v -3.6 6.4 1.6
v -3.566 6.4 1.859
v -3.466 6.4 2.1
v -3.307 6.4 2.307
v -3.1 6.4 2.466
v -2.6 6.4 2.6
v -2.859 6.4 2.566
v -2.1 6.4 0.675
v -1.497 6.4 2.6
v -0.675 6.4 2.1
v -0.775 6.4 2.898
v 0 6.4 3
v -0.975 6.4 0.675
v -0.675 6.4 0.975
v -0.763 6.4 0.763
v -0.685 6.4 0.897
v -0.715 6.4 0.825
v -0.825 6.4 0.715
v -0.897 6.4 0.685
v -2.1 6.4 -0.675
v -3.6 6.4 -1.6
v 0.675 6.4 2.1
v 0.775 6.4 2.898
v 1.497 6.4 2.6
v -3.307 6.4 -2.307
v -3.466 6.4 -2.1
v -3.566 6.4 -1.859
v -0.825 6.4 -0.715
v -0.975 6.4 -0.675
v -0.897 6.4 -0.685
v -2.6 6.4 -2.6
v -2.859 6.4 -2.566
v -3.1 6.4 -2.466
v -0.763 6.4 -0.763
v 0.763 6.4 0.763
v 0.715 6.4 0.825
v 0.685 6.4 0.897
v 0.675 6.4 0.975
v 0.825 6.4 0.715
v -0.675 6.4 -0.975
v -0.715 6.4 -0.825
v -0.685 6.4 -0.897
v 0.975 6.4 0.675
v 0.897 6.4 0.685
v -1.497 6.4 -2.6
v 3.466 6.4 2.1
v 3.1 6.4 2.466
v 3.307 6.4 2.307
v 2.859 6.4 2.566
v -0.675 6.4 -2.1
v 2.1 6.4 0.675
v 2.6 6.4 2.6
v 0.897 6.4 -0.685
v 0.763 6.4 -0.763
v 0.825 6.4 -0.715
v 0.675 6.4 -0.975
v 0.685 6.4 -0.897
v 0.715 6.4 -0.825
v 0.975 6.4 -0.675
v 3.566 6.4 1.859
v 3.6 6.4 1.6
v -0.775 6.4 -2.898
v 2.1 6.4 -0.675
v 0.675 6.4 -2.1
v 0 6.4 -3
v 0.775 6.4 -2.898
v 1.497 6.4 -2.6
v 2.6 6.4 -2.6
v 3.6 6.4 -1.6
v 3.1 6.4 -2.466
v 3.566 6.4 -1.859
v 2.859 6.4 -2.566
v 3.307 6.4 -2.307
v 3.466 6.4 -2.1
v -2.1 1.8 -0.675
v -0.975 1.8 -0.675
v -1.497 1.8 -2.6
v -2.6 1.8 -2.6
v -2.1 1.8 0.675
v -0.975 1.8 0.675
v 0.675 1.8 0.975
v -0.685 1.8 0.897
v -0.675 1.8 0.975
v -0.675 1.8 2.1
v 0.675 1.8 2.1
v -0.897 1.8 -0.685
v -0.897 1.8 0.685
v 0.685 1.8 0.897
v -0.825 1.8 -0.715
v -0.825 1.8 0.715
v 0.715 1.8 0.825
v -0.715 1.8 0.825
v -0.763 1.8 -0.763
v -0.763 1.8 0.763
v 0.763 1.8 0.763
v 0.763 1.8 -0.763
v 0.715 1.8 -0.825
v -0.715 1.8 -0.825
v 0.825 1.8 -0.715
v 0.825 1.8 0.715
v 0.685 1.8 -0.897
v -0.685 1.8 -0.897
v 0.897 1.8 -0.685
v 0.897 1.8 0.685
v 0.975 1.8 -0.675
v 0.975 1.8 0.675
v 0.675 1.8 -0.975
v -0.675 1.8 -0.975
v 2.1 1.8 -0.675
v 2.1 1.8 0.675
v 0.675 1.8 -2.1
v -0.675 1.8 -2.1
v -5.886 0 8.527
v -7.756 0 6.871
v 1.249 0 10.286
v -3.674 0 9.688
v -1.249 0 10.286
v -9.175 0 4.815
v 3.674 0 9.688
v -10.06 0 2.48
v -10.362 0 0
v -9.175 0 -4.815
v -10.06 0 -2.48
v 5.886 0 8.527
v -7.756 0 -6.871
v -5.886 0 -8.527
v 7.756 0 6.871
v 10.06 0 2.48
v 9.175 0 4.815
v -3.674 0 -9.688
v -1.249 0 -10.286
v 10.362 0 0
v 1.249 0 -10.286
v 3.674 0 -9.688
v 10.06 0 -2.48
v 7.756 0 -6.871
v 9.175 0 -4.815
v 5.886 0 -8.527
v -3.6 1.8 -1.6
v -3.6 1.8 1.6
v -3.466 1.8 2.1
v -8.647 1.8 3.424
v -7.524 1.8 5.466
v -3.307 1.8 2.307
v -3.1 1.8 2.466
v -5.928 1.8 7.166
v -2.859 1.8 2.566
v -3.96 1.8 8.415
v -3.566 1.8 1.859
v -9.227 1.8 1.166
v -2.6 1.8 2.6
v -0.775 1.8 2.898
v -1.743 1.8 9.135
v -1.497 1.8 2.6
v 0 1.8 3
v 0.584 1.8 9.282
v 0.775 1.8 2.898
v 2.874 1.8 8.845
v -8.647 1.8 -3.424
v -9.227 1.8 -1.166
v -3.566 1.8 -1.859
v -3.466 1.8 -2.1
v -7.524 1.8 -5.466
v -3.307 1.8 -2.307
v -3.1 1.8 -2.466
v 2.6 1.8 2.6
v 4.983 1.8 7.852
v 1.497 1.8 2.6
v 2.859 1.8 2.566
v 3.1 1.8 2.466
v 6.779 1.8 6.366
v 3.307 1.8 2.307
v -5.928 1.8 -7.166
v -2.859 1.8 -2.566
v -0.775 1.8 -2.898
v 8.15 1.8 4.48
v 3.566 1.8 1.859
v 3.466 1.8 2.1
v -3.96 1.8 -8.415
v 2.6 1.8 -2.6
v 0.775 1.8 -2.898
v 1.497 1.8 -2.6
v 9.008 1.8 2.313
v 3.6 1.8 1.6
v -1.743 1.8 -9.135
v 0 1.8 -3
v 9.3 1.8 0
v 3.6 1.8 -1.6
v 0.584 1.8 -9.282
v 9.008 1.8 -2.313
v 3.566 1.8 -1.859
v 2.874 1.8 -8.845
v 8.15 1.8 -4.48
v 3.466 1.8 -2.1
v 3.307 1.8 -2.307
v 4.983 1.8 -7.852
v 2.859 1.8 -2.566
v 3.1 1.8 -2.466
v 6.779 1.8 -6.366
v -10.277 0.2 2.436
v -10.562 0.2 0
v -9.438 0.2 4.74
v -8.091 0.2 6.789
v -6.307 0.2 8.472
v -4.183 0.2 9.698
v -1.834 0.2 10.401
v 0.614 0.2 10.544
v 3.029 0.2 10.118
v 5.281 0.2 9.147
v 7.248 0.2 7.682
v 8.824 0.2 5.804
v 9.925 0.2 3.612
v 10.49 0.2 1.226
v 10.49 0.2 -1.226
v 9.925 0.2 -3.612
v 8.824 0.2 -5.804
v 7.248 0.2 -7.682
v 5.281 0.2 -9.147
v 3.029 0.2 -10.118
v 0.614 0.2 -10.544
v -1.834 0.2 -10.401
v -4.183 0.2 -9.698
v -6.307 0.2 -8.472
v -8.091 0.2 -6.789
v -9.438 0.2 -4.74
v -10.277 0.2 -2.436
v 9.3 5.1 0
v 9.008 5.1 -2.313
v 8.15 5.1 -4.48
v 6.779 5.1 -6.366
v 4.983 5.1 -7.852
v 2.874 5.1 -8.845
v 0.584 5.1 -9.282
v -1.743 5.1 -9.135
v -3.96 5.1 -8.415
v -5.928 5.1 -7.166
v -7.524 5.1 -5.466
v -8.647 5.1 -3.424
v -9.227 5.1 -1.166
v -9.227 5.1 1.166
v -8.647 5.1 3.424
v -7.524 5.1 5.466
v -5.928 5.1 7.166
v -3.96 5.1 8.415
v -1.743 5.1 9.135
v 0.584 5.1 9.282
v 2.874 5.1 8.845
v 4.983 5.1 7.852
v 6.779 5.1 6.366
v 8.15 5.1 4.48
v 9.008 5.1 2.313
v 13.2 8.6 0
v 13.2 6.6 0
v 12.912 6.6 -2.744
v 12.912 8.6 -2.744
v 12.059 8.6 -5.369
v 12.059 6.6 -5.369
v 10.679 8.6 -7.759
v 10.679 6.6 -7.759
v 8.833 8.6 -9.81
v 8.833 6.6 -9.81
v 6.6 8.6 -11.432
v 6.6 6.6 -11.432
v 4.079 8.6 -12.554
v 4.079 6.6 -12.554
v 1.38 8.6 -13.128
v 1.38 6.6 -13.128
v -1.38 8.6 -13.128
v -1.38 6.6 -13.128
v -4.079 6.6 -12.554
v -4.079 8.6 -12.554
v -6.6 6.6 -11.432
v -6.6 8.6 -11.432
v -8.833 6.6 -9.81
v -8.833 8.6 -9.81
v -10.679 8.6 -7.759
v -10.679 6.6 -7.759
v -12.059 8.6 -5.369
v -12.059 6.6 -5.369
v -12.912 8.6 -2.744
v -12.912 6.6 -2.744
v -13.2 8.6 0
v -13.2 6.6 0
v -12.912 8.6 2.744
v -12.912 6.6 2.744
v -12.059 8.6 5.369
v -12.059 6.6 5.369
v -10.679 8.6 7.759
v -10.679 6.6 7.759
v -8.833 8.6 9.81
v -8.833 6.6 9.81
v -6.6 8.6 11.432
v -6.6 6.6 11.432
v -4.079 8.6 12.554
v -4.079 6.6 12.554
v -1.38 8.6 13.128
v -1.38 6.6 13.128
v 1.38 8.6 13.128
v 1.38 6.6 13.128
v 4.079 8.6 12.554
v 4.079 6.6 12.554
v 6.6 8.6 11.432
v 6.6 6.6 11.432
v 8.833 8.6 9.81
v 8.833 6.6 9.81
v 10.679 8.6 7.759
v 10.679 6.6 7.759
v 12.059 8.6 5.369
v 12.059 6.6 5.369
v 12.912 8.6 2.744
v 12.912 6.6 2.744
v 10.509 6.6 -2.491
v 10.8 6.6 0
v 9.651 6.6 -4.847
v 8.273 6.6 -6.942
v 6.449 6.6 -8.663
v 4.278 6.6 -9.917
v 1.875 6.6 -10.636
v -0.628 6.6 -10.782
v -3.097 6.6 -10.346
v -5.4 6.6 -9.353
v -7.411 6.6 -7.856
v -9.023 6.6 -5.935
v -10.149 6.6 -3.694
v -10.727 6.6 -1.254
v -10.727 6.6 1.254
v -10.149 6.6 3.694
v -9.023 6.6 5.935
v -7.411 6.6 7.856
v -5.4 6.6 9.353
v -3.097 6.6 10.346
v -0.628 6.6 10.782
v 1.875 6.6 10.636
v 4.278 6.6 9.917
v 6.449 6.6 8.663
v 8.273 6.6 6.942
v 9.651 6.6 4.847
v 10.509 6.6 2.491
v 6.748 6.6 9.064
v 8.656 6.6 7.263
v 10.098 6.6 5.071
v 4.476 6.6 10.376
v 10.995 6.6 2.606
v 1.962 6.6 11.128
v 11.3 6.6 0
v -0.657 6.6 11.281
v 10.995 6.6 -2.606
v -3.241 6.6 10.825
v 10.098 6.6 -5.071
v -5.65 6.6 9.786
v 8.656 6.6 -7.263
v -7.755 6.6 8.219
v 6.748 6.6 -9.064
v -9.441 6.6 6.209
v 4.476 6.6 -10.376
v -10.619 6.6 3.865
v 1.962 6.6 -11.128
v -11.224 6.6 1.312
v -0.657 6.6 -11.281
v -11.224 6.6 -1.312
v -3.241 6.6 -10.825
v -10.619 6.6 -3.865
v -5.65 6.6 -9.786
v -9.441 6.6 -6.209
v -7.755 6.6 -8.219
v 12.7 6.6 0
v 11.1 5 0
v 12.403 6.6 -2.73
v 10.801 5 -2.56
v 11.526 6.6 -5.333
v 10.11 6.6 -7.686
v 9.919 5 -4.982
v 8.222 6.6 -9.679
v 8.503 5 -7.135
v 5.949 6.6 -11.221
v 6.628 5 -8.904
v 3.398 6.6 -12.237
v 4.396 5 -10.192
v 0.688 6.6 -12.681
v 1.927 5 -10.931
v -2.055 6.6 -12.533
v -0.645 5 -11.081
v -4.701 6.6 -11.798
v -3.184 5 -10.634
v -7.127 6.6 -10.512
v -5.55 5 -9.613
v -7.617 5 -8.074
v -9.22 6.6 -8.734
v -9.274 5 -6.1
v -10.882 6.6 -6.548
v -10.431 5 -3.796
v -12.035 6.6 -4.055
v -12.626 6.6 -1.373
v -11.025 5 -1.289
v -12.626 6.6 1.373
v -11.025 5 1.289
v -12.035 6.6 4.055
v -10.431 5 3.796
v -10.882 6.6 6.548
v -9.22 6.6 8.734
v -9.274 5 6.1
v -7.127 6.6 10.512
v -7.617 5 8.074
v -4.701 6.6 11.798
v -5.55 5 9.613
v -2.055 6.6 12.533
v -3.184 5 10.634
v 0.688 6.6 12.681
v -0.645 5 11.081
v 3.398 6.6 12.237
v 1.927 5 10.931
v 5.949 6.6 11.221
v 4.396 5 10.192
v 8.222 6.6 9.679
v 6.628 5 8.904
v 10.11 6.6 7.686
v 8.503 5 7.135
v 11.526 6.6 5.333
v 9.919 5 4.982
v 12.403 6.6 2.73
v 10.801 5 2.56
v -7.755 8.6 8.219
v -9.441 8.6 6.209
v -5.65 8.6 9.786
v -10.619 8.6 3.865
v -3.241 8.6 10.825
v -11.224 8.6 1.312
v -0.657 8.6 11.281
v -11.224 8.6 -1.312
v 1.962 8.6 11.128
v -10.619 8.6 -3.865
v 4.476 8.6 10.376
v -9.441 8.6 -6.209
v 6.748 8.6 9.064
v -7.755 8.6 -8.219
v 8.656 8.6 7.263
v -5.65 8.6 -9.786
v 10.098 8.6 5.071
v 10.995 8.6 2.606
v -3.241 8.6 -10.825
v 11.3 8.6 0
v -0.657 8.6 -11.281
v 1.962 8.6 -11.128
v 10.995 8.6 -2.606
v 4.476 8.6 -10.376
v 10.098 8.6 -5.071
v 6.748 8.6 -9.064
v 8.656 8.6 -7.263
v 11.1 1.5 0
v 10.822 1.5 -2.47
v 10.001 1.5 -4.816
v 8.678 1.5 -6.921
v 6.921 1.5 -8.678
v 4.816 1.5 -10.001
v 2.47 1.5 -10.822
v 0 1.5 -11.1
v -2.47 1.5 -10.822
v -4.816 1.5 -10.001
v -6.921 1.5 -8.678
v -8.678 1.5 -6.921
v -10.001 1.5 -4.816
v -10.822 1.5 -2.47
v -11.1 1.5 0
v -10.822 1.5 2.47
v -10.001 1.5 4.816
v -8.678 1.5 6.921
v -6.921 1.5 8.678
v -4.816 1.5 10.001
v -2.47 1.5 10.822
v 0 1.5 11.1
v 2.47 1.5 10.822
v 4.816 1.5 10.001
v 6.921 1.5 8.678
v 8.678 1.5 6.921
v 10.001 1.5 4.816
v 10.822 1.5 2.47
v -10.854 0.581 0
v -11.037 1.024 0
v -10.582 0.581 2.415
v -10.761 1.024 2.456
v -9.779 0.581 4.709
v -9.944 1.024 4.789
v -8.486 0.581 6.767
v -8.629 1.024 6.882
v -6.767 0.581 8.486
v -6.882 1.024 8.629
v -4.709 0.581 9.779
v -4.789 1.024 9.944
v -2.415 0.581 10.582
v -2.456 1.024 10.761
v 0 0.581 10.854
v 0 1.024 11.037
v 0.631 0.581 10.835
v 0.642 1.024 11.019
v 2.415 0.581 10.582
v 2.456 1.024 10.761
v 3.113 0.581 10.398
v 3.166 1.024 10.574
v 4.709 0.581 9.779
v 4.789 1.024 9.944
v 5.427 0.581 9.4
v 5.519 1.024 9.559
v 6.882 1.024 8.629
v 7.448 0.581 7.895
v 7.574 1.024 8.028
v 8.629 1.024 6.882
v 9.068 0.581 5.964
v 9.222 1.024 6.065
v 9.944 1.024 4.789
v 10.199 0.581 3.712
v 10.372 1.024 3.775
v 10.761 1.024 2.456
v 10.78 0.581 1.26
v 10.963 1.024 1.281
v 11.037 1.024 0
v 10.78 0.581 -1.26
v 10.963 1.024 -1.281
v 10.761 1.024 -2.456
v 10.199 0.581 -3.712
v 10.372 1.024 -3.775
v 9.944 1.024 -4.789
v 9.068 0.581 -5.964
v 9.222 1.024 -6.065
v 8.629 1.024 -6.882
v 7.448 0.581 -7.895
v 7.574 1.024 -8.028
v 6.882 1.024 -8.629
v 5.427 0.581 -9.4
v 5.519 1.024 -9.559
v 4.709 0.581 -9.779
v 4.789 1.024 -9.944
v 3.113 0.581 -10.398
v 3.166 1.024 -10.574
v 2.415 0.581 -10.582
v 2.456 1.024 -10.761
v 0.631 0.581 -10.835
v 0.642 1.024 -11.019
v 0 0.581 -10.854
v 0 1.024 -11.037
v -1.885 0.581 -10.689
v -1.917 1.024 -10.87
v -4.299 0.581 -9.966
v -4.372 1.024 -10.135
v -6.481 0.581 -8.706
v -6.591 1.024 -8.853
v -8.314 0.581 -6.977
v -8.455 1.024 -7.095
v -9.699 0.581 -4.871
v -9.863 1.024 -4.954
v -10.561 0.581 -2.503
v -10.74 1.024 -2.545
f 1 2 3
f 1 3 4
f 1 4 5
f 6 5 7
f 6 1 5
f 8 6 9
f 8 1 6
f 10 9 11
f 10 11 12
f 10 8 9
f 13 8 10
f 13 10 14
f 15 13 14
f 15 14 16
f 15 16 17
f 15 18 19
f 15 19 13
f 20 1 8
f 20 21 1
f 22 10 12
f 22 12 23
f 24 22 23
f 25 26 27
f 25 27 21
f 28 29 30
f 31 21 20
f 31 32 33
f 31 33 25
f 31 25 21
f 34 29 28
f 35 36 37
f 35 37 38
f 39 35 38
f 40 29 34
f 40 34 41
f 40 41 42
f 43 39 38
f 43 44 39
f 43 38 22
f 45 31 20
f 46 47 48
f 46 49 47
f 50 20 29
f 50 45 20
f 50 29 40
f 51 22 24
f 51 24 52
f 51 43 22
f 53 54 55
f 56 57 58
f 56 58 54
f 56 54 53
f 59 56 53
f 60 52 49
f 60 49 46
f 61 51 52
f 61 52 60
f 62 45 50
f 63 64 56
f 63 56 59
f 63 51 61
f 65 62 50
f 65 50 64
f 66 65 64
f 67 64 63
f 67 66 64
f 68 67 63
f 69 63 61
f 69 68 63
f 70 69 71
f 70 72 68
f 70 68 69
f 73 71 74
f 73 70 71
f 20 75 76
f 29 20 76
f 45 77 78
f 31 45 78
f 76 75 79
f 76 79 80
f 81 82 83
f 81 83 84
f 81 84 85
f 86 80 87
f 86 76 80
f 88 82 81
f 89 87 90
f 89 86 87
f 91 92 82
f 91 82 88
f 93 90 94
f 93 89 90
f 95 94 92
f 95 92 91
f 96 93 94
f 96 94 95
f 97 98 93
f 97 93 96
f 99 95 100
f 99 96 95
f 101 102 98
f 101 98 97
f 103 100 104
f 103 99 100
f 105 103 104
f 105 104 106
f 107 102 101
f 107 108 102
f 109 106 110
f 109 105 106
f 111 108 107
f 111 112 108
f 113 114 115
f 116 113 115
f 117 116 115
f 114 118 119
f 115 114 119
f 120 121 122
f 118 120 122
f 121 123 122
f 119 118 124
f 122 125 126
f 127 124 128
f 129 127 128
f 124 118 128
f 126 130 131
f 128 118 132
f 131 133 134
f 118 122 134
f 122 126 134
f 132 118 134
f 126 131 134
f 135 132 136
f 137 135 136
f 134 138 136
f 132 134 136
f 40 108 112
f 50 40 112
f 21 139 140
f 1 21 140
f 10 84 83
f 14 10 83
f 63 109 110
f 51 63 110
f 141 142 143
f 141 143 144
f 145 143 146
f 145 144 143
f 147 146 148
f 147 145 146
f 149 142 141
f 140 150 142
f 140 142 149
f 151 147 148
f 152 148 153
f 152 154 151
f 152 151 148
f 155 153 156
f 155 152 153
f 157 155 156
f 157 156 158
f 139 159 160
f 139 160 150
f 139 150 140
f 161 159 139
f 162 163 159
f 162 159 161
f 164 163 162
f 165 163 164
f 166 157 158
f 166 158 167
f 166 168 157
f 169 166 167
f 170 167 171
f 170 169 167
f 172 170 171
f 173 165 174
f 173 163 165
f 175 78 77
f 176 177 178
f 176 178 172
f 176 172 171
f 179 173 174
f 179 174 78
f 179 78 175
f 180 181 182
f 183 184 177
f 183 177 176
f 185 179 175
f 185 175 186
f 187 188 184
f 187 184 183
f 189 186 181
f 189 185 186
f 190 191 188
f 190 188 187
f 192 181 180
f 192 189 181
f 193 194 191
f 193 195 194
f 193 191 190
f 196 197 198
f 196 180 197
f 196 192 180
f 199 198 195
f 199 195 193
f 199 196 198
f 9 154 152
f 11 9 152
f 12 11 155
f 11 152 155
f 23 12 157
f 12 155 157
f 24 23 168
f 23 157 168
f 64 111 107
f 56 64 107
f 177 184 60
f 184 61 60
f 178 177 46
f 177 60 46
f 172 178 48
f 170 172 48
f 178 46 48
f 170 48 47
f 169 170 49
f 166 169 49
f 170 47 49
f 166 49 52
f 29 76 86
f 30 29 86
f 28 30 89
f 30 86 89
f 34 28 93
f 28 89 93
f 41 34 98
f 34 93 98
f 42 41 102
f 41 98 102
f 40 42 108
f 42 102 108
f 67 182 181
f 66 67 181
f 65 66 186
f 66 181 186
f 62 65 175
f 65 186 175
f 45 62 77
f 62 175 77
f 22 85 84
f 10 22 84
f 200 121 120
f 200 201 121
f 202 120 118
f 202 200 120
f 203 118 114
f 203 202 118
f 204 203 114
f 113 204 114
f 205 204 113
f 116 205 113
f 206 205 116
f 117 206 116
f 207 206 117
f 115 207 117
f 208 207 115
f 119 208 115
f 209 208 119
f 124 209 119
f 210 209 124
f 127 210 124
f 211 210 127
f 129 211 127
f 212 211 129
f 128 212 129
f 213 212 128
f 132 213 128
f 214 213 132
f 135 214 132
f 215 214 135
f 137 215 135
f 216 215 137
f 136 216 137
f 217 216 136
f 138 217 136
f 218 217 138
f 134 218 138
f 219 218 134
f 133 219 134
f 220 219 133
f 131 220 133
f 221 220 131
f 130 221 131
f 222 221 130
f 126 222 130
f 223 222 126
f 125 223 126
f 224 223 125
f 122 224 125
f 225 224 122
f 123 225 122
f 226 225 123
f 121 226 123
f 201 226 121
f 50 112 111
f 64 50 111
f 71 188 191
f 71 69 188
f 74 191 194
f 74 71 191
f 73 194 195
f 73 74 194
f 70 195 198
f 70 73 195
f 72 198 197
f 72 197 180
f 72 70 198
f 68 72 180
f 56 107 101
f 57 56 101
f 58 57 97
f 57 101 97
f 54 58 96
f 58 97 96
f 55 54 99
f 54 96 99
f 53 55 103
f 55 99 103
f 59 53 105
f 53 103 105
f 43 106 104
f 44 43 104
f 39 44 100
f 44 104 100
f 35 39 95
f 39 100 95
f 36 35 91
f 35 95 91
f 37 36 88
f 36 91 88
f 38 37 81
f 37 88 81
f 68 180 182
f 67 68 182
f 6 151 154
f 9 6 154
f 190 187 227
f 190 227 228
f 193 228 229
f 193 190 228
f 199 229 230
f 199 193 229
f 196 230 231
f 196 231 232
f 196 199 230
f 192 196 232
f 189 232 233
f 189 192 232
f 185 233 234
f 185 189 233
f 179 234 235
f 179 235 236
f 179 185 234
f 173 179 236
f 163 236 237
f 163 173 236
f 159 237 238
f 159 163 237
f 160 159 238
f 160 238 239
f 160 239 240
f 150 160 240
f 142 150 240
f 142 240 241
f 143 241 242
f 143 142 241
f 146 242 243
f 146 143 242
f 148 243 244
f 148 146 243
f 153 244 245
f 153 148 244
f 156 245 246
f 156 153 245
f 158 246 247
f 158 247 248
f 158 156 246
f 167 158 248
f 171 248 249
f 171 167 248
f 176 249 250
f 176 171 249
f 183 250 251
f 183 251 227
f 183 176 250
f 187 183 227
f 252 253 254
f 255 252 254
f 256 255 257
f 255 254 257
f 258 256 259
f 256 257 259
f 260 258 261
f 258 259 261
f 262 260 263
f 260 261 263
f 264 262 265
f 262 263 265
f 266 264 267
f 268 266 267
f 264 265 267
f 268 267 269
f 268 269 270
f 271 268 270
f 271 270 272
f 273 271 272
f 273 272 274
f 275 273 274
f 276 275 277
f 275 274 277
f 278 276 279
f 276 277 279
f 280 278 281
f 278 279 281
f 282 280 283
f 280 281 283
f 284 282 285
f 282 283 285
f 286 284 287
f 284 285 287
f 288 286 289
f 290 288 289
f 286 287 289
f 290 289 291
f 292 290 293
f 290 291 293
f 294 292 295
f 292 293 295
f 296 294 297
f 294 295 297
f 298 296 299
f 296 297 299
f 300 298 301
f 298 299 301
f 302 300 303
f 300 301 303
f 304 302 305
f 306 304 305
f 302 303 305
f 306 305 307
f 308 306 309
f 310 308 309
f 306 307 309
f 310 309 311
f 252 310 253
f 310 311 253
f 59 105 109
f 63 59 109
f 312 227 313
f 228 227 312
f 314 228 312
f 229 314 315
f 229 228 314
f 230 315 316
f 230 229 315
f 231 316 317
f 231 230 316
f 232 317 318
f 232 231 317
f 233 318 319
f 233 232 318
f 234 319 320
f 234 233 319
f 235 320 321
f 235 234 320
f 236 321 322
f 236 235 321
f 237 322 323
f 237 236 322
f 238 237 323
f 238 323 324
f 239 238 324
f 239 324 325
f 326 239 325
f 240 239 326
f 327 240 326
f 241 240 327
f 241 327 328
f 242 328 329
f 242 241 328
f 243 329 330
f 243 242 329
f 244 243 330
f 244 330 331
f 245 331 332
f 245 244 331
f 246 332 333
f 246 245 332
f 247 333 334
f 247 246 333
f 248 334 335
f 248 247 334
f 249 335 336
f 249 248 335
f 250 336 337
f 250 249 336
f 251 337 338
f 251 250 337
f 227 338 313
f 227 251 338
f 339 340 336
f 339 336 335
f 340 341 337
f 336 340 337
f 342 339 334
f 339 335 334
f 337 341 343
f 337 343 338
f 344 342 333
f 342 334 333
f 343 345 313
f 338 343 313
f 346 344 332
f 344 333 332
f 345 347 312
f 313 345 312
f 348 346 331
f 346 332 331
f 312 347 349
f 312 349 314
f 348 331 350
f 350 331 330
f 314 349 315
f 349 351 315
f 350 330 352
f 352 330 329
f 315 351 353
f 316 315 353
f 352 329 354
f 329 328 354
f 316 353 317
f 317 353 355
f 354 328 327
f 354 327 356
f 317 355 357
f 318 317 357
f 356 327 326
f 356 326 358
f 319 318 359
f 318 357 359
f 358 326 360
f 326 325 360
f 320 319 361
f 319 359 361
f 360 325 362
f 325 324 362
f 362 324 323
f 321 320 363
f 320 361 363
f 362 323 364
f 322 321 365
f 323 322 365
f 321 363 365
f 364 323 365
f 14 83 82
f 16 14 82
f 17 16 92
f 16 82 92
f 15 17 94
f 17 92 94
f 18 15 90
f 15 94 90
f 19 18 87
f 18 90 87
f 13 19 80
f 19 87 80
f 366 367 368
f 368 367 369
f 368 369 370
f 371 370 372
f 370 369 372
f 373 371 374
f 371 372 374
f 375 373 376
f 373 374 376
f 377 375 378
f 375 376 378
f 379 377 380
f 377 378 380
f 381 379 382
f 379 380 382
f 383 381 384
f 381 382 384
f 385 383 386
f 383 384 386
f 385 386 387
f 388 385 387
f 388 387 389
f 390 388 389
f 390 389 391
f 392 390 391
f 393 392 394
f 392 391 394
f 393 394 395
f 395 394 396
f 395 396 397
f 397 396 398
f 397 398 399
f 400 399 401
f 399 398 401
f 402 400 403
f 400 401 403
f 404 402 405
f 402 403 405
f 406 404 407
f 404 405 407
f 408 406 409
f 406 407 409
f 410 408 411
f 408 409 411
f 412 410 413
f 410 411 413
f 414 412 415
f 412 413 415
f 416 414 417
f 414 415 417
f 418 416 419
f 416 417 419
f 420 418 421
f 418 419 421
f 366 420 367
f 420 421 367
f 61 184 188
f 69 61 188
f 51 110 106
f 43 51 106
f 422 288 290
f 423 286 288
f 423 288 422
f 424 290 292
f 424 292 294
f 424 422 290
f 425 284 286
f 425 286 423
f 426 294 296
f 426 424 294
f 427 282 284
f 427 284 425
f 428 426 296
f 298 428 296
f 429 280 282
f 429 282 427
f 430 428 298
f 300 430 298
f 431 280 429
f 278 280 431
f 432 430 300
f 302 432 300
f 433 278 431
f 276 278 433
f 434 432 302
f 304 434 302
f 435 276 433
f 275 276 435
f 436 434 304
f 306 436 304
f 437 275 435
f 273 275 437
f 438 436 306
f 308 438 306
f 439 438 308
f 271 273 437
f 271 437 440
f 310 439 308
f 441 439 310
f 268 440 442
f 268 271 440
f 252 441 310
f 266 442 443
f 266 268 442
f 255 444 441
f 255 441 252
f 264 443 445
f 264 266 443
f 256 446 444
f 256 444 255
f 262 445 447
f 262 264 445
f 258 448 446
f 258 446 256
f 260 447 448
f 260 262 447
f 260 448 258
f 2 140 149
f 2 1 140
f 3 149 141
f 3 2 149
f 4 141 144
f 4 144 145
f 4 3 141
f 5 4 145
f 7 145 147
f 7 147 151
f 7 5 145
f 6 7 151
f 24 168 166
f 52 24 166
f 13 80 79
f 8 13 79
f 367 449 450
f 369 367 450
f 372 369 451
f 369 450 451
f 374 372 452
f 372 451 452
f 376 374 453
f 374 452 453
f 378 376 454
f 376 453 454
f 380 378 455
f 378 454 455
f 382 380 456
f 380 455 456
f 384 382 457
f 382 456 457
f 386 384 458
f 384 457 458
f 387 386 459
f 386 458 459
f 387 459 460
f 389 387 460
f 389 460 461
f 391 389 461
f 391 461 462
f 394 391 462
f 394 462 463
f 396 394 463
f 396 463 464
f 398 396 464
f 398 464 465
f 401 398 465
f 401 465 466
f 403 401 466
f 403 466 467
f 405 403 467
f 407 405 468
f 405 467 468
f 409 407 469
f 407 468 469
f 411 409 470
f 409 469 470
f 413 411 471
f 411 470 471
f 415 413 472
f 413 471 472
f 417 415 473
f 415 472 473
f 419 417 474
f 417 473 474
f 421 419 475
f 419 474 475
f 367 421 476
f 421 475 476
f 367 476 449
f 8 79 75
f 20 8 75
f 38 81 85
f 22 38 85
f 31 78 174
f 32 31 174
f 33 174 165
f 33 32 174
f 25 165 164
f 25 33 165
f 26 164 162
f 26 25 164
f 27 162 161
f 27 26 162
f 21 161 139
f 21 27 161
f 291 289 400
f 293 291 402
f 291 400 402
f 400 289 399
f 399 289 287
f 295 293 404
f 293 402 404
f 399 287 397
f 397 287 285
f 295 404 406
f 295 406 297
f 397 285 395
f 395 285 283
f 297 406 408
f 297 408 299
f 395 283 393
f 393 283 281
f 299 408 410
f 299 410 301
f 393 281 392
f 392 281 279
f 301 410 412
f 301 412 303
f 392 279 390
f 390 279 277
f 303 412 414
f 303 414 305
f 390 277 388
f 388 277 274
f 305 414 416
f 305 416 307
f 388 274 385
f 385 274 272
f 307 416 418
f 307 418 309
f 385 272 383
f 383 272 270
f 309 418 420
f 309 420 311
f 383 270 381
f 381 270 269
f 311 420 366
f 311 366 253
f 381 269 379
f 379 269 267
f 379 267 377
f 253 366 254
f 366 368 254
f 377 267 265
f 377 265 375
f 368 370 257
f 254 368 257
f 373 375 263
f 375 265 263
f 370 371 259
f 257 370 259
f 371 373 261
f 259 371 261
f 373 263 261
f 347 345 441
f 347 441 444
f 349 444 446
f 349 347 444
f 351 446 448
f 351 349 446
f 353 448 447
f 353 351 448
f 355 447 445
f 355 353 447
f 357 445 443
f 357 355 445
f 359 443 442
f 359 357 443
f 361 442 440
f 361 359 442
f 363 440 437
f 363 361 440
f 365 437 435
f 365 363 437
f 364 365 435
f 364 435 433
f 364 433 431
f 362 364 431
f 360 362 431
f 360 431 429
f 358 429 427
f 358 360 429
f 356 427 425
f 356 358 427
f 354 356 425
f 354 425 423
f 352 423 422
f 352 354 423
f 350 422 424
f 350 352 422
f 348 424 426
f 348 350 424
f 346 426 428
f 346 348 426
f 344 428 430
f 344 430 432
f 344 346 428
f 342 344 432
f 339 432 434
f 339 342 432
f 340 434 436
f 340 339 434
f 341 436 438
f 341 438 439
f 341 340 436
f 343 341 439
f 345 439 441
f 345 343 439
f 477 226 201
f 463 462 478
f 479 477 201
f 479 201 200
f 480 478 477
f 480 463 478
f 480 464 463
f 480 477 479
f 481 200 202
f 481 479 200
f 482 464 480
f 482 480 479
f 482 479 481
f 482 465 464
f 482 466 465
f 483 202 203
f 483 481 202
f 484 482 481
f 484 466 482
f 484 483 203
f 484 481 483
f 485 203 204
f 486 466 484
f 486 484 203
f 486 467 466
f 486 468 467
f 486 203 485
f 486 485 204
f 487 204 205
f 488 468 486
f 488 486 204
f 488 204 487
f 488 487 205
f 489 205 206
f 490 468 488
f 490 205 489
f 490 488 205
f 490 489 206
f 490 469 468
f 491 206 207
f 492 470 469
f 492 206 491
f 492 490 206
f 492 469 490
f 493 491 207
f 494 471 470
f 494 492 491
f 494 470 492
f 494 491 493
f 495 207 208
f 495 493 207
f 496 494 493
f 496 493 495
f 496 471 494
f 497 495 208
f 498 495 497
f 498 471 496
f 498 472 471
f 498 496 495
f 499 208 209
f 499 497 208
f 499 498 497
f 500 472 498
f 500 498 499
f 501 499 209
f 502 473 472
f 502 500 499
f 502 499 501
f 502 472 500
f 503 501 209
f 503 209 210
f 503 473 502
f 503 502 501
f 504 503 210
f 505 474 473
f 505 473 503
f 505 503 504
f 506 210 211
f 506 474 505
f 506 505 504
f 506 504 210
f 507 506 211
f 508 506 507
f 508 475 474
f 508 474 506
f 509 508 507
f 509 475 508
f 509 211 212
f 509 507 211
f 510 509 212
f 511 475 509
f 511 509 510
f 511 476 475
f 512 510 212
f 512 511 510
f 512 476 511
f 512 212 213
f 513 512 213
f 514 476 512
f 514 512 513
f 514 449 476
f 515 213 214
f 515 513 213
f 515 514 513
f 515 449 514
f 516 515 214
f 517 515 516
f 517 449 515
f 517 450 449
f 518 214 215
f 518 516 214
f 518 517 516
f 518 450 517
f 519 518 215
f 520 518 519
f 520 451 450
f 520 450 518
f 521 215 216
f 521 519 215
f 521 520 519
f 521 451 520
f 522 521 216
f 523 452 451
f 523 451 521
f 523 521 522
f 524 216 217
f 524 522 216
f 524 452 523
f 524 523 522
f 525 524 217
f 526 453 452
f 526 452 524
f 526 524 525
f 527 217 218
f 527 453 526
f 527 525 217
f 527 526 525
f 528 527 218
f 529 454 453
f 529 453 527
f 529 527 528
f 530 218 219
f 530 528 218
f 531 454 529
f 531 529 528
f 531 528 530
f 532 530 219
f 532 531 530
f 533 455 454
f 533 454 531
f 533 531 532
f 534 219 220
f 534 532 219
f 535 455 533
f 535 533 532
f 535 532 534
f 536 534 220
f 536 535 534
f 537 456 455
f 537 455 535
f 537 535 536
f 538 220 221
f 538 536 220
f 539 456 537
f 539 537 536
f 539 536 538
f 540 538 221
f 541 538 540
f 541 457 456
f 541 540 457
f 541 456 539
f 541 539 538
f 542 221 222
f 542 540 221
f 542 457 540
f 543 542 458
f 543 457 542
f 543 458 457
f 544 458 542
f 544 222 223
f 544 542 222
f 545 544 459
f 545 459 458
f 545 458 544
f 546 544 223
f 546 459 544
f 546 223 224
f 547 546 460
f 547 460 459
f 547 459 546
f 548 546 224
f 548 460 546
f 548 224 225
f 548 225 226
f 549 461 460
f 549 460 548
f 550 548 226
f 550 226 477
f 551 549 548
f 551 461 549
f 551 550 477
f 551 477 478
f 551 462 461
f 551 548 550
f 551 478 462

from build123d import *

# Parameters (mm, degrees)
SKETCH1_R           = 11.1
BUTTON_TOP_DEPTH    = 1.8
SKETCH2_R           = 11.1
SKETCH2_R_2         = 9.3
BUTTON_WALLS_DEPTH  = 4.8
STEM_HOUSING_DEPTH  = 4.6
CHAMFER1_SIZE       = 1.5
FILLET2_R           = 1
SKETCH8_R           = 13.2
SKETCH8_R_2         = 11.3
BOSS_EXTRUDE1_DEPTH = 2


with BuildPart() as part:
    # Sketch1 → button top (new body)
    with BuildSketch(Plane(origin=(0, 0, 0), x_dir=(1, 0, 0), z_dir=(0, 1, 0))):
        Circle(SKETCH1_R)
    extrude(amount=BUTTON_TOP_DEPTH)

    # Sketch2 → button walls (add)
    with BuildSketch(Plane(origin=(0, 1.8, 0), x_dir=(1, 0, 0), z_dir=(0, 1, 0))):
        Circle(SKETCH2_R)
        Circle(SKETCH2_R_2, mode=Mode.SUBTRACT)
    extrude(amount=BUTTON_WALLS_DEPTH)

    # Sketch3 → stem housing (add)
    with BuildSketch(Plane(origin=(0, 1.8, 0), x_dir=(1, 0, 0), z_dir=(0, 1, 0))):
        with BuildLine():
            ThreePointArc((3, 0), (2.597112711, -1.501667596), (1.496662955, -2.6))
            Line((1.496662955, -2.6), (3.6, -2.6))
            Line((3.6, -2.6), (3.6, 2.6))
            Line((3.6, 2.6), (1.496662955, 2.6))
            ThreePointArc((1.496662955, 2.6), (2.597112711, 1.501667596), (3, 0))
        make_face()
        with BuildLine():
            ThreePointArc((-1.496662955, 2.6), (-3, 0), (-1.496662955, -2.6))
            Line((-1.496662955, -2.6), (1.496662955, -2.6))
            ThreePointArc((1.496662955, -2.6), (2.597112711, -1.501667596), (3, 0))
            ThreePointArc((3, 0), (2.597112711, 1.501667596), (1.496662955, 2.6))
            Line((1.496662955, 2.6), (-1.496662955, 2.6))
        make_face()
        with BuildLine():
            ThreePointArc((-0.975, 0.675), (-0.762867966, 0.762867966), (-0.675, 0.975))
            Line((-0.675, 0.975), (-0.675, 2.1))
            Line((-0.675, 2.1), (0.675, 2.1))
            Line((0.675, 2.1), (0.675, 0.975))
            ThreePointArc((0.675, 0.975), (0.762867966, 0.762867966), (0.975, 0.675))
            Line((0.975, 0.675), (2.1, 0.675))
            Line((2.1, 0.675), (2.1, -0.675))
            Line((2.1, -0.675), (0.975, -0.675))
            ThreePointArc((0.975, -0.675), (0.762867966, -0.762867966), (0.675, -0.975))
            Line((0.675, -0.975), (0.675, -2.1))
            Line((0.675, -2.1), (-0.675, -2.1))
            Line((-0.675, -2.1), (-0.675, -0.975))
            ThreePointArc((-0.675, -0.975), (-0.762867966, -0.762867966), (-0.975, -0.675))
            Line((-0.975, -0.675), (-2.1, -0.675))
            Line((-2.1, -0.675), (-2.1, 0.675))
            Line((-2.1, 0.675), (-0.975, 0.675))
        make_face(mode=Mode.SUBTRACT)
        with BuildLine():
            Line((1.496662955, -2.6), (-1.496662955, -2.6))
            ThreePointArc((-1.496662955, -2.6), (0, -3), (1.496662955, -2.6))
        make_face()
        with BuildLine():
            Line((-3.6, 2.6), (-3.6, -2.6))
            Line((-3.6, -2.6), (-1.496662955, -2.6))
            ThreePointArc((-1.496662955, -2.6), (-3, 0), (-1.496662955, 2.6))
            Line((-1.496662955, 2.6), (-3.6, 2.6))
        make_face()
        with BuildLine():
            ThreePointArc((1.496662955, 2.6), (0, 3), (-1.496662955, 2.6))
            Line((-1.496662955, 2.6), (1.496662955, 2.6))
        make_face()
    extrude(amount=STEM_HOUSING_DEPTH)

    # Chamfer1
    chamfer1_edges = [part.edges().sort_by_distance(p)[0] for p in [
        (-9.3, 6.6, 0),
    ]]
    chamfer(chamfer1_edges, length=CHAMFER1_SIZE)

    # Fillet2
    fillet2_edges = [part.edges().sort_by_distance(p)[0] for p in [
        (3.6, 4.1, 2.6),
        (3.6, 4.1, -2.6),
        (-3.6, 4.1, -2.6),
        (-3.6, 4.1, 2.6),
    ]]
    fillet(fillet2_edges, radius=FILLET2_R)

    # Sketch6 → Cut-Revolve1 (revolve, cut)
    with BuildSketch(Plane.XY):
        with BuildLine():
            Line((-10.361522369, 0), (-10.561522369, 0.2))
            ThreePointArc((-10.561522369, 0.2), (-10.960054223, 0.79644507), (-11.1, 1.5))
            Line((-11.1, 1.5), (-11.1, 0))
            Line((-11.1, 0), (-10.361522369, 0))
        make_face()
    revolve(axis=Axis((0, 0, 0), (0, 1, 0)), mode=Mode.SUBTRACT)

    # Sketch7 → Revolve1 (revolve)
    with BuildSketch(Plane.XY):
        Polygon((11.1, 6.6), (12.7, 6.6), (11.1, 5), align=None)
    revolve(axis=Axis((0, 0, 0), (0, 1, 0)))

    # Sketch8 → Boss-Extrude1 (add)
    with BuildSketch(Plane(origin=(0, 6.6, 0), x_dir=(1, 0, 0), z_dir=(0, 1, 0))):
        Circle(SKETCH8_R)
        Circle(SKETCH8_R_2, mode=Mode.SUBTRACT)
    extrude(amount=BOSS_EXTRUDE1_DEPTH)


solid = part.part
